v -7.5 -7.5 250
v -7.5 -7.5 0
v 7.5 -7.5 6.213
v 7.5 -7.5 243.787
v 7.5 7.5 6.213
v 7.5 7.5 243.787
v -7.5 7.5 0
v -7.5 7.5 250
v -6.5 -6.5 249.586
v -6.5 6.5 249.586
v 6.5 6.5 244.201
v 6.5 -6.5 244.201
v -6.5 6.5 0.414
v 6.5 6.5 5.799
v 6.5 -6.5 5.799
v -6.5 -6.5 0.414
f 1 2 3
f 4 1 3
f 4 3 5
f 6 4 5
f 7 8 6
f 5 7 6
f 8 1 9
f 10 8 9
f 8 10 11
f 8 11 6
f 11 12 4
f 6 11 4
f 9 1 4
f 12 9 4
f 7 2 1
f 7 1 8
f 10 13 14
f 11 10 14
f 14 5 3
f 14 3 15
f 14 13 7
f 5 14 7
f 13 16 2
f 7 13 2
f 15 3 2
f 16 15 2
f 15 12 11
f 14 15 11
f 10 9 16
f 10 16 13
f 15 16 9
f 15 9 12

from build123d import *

# Parameters (mm, degrees)
F1_W     = 15
F1_H     = 15
F1_W_2   = 13
F1_H_2   = 13
F2_DEPTH = 250
F4_DEPTH = 25


with BuildPart() as f2:
    # F1 (on Top) → F2 (new body)
    with BuildSketch(Plane.XY):
        Rectangle(F1_W, F1_H)
        Rectangle(F1_W_2, F1_H_2, mode=Mode.SUBTRACT)
    extrude(amount=F2_DEPTH)

    # F3 (on face) → F4 (cut)
    with BuildSketch(Plane.XZ.offset(7.5)):
        Polygon((7.5, 6.2132034356), (-7.5, 0), (7.5, 0), align=None)
        Polygon((7.5, 250), (-7.5, 250), (7.5, 243.7867965644), align=None)
    extrude(amount=-F4_DEPTH, mode=Mode.SUBTRACT)


solid = f2.part
